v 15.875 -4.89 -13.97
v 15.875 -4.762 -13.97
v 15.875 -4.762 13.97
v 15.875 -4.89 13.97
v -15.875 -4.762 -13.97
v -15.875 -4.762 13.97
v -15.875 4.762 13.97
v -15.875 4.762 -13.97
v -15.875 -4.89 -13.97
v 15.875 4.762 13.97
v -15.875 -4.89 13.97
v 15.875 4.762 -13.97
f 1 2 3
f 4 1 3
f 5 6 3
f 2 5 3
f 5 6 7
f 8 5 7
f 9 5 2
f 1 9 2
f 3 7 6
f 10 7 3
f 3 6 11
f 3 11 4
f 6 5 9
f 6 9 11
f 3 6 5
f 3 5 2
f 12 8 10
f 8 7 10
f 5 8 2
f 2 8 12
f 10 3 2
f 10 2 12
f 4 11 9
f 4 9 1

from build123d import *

# Parameters (mm, degrees)
SKETCH3_W           = 31.75
SKETCH3_H           = 9.525
BOSS_EXTRUDE1_DEPTH = 13.97
SKETCH4_W           = 31.75
SKETCH4_H           = 27.94
BOSS_EXTRUDE2_DEPTH = 0.127


with BuildPart() as part:
    # Sketch3 → Boss-Extrude1 (new, symmetric)
    with BuildSketch(Plane.XY):
        Rectangle(SKETCH3_W, SKETCH3_H)
    extrude(amount=BOSS_EXTRUDE1_DEPTH, both=True)


with BuildPart() as body_2:
    # Sketch4 → Boss-Extrude2 (new body)
    with BuildSketch(Plane.XZ.offset(4.7625)):
        Rectangle(SKETCH4_W, SKETCH4_H)
    extrude(amount=BOSS_EXTRUDE2_DEPTH)


solid = Compound([part.part, body_2.part])
